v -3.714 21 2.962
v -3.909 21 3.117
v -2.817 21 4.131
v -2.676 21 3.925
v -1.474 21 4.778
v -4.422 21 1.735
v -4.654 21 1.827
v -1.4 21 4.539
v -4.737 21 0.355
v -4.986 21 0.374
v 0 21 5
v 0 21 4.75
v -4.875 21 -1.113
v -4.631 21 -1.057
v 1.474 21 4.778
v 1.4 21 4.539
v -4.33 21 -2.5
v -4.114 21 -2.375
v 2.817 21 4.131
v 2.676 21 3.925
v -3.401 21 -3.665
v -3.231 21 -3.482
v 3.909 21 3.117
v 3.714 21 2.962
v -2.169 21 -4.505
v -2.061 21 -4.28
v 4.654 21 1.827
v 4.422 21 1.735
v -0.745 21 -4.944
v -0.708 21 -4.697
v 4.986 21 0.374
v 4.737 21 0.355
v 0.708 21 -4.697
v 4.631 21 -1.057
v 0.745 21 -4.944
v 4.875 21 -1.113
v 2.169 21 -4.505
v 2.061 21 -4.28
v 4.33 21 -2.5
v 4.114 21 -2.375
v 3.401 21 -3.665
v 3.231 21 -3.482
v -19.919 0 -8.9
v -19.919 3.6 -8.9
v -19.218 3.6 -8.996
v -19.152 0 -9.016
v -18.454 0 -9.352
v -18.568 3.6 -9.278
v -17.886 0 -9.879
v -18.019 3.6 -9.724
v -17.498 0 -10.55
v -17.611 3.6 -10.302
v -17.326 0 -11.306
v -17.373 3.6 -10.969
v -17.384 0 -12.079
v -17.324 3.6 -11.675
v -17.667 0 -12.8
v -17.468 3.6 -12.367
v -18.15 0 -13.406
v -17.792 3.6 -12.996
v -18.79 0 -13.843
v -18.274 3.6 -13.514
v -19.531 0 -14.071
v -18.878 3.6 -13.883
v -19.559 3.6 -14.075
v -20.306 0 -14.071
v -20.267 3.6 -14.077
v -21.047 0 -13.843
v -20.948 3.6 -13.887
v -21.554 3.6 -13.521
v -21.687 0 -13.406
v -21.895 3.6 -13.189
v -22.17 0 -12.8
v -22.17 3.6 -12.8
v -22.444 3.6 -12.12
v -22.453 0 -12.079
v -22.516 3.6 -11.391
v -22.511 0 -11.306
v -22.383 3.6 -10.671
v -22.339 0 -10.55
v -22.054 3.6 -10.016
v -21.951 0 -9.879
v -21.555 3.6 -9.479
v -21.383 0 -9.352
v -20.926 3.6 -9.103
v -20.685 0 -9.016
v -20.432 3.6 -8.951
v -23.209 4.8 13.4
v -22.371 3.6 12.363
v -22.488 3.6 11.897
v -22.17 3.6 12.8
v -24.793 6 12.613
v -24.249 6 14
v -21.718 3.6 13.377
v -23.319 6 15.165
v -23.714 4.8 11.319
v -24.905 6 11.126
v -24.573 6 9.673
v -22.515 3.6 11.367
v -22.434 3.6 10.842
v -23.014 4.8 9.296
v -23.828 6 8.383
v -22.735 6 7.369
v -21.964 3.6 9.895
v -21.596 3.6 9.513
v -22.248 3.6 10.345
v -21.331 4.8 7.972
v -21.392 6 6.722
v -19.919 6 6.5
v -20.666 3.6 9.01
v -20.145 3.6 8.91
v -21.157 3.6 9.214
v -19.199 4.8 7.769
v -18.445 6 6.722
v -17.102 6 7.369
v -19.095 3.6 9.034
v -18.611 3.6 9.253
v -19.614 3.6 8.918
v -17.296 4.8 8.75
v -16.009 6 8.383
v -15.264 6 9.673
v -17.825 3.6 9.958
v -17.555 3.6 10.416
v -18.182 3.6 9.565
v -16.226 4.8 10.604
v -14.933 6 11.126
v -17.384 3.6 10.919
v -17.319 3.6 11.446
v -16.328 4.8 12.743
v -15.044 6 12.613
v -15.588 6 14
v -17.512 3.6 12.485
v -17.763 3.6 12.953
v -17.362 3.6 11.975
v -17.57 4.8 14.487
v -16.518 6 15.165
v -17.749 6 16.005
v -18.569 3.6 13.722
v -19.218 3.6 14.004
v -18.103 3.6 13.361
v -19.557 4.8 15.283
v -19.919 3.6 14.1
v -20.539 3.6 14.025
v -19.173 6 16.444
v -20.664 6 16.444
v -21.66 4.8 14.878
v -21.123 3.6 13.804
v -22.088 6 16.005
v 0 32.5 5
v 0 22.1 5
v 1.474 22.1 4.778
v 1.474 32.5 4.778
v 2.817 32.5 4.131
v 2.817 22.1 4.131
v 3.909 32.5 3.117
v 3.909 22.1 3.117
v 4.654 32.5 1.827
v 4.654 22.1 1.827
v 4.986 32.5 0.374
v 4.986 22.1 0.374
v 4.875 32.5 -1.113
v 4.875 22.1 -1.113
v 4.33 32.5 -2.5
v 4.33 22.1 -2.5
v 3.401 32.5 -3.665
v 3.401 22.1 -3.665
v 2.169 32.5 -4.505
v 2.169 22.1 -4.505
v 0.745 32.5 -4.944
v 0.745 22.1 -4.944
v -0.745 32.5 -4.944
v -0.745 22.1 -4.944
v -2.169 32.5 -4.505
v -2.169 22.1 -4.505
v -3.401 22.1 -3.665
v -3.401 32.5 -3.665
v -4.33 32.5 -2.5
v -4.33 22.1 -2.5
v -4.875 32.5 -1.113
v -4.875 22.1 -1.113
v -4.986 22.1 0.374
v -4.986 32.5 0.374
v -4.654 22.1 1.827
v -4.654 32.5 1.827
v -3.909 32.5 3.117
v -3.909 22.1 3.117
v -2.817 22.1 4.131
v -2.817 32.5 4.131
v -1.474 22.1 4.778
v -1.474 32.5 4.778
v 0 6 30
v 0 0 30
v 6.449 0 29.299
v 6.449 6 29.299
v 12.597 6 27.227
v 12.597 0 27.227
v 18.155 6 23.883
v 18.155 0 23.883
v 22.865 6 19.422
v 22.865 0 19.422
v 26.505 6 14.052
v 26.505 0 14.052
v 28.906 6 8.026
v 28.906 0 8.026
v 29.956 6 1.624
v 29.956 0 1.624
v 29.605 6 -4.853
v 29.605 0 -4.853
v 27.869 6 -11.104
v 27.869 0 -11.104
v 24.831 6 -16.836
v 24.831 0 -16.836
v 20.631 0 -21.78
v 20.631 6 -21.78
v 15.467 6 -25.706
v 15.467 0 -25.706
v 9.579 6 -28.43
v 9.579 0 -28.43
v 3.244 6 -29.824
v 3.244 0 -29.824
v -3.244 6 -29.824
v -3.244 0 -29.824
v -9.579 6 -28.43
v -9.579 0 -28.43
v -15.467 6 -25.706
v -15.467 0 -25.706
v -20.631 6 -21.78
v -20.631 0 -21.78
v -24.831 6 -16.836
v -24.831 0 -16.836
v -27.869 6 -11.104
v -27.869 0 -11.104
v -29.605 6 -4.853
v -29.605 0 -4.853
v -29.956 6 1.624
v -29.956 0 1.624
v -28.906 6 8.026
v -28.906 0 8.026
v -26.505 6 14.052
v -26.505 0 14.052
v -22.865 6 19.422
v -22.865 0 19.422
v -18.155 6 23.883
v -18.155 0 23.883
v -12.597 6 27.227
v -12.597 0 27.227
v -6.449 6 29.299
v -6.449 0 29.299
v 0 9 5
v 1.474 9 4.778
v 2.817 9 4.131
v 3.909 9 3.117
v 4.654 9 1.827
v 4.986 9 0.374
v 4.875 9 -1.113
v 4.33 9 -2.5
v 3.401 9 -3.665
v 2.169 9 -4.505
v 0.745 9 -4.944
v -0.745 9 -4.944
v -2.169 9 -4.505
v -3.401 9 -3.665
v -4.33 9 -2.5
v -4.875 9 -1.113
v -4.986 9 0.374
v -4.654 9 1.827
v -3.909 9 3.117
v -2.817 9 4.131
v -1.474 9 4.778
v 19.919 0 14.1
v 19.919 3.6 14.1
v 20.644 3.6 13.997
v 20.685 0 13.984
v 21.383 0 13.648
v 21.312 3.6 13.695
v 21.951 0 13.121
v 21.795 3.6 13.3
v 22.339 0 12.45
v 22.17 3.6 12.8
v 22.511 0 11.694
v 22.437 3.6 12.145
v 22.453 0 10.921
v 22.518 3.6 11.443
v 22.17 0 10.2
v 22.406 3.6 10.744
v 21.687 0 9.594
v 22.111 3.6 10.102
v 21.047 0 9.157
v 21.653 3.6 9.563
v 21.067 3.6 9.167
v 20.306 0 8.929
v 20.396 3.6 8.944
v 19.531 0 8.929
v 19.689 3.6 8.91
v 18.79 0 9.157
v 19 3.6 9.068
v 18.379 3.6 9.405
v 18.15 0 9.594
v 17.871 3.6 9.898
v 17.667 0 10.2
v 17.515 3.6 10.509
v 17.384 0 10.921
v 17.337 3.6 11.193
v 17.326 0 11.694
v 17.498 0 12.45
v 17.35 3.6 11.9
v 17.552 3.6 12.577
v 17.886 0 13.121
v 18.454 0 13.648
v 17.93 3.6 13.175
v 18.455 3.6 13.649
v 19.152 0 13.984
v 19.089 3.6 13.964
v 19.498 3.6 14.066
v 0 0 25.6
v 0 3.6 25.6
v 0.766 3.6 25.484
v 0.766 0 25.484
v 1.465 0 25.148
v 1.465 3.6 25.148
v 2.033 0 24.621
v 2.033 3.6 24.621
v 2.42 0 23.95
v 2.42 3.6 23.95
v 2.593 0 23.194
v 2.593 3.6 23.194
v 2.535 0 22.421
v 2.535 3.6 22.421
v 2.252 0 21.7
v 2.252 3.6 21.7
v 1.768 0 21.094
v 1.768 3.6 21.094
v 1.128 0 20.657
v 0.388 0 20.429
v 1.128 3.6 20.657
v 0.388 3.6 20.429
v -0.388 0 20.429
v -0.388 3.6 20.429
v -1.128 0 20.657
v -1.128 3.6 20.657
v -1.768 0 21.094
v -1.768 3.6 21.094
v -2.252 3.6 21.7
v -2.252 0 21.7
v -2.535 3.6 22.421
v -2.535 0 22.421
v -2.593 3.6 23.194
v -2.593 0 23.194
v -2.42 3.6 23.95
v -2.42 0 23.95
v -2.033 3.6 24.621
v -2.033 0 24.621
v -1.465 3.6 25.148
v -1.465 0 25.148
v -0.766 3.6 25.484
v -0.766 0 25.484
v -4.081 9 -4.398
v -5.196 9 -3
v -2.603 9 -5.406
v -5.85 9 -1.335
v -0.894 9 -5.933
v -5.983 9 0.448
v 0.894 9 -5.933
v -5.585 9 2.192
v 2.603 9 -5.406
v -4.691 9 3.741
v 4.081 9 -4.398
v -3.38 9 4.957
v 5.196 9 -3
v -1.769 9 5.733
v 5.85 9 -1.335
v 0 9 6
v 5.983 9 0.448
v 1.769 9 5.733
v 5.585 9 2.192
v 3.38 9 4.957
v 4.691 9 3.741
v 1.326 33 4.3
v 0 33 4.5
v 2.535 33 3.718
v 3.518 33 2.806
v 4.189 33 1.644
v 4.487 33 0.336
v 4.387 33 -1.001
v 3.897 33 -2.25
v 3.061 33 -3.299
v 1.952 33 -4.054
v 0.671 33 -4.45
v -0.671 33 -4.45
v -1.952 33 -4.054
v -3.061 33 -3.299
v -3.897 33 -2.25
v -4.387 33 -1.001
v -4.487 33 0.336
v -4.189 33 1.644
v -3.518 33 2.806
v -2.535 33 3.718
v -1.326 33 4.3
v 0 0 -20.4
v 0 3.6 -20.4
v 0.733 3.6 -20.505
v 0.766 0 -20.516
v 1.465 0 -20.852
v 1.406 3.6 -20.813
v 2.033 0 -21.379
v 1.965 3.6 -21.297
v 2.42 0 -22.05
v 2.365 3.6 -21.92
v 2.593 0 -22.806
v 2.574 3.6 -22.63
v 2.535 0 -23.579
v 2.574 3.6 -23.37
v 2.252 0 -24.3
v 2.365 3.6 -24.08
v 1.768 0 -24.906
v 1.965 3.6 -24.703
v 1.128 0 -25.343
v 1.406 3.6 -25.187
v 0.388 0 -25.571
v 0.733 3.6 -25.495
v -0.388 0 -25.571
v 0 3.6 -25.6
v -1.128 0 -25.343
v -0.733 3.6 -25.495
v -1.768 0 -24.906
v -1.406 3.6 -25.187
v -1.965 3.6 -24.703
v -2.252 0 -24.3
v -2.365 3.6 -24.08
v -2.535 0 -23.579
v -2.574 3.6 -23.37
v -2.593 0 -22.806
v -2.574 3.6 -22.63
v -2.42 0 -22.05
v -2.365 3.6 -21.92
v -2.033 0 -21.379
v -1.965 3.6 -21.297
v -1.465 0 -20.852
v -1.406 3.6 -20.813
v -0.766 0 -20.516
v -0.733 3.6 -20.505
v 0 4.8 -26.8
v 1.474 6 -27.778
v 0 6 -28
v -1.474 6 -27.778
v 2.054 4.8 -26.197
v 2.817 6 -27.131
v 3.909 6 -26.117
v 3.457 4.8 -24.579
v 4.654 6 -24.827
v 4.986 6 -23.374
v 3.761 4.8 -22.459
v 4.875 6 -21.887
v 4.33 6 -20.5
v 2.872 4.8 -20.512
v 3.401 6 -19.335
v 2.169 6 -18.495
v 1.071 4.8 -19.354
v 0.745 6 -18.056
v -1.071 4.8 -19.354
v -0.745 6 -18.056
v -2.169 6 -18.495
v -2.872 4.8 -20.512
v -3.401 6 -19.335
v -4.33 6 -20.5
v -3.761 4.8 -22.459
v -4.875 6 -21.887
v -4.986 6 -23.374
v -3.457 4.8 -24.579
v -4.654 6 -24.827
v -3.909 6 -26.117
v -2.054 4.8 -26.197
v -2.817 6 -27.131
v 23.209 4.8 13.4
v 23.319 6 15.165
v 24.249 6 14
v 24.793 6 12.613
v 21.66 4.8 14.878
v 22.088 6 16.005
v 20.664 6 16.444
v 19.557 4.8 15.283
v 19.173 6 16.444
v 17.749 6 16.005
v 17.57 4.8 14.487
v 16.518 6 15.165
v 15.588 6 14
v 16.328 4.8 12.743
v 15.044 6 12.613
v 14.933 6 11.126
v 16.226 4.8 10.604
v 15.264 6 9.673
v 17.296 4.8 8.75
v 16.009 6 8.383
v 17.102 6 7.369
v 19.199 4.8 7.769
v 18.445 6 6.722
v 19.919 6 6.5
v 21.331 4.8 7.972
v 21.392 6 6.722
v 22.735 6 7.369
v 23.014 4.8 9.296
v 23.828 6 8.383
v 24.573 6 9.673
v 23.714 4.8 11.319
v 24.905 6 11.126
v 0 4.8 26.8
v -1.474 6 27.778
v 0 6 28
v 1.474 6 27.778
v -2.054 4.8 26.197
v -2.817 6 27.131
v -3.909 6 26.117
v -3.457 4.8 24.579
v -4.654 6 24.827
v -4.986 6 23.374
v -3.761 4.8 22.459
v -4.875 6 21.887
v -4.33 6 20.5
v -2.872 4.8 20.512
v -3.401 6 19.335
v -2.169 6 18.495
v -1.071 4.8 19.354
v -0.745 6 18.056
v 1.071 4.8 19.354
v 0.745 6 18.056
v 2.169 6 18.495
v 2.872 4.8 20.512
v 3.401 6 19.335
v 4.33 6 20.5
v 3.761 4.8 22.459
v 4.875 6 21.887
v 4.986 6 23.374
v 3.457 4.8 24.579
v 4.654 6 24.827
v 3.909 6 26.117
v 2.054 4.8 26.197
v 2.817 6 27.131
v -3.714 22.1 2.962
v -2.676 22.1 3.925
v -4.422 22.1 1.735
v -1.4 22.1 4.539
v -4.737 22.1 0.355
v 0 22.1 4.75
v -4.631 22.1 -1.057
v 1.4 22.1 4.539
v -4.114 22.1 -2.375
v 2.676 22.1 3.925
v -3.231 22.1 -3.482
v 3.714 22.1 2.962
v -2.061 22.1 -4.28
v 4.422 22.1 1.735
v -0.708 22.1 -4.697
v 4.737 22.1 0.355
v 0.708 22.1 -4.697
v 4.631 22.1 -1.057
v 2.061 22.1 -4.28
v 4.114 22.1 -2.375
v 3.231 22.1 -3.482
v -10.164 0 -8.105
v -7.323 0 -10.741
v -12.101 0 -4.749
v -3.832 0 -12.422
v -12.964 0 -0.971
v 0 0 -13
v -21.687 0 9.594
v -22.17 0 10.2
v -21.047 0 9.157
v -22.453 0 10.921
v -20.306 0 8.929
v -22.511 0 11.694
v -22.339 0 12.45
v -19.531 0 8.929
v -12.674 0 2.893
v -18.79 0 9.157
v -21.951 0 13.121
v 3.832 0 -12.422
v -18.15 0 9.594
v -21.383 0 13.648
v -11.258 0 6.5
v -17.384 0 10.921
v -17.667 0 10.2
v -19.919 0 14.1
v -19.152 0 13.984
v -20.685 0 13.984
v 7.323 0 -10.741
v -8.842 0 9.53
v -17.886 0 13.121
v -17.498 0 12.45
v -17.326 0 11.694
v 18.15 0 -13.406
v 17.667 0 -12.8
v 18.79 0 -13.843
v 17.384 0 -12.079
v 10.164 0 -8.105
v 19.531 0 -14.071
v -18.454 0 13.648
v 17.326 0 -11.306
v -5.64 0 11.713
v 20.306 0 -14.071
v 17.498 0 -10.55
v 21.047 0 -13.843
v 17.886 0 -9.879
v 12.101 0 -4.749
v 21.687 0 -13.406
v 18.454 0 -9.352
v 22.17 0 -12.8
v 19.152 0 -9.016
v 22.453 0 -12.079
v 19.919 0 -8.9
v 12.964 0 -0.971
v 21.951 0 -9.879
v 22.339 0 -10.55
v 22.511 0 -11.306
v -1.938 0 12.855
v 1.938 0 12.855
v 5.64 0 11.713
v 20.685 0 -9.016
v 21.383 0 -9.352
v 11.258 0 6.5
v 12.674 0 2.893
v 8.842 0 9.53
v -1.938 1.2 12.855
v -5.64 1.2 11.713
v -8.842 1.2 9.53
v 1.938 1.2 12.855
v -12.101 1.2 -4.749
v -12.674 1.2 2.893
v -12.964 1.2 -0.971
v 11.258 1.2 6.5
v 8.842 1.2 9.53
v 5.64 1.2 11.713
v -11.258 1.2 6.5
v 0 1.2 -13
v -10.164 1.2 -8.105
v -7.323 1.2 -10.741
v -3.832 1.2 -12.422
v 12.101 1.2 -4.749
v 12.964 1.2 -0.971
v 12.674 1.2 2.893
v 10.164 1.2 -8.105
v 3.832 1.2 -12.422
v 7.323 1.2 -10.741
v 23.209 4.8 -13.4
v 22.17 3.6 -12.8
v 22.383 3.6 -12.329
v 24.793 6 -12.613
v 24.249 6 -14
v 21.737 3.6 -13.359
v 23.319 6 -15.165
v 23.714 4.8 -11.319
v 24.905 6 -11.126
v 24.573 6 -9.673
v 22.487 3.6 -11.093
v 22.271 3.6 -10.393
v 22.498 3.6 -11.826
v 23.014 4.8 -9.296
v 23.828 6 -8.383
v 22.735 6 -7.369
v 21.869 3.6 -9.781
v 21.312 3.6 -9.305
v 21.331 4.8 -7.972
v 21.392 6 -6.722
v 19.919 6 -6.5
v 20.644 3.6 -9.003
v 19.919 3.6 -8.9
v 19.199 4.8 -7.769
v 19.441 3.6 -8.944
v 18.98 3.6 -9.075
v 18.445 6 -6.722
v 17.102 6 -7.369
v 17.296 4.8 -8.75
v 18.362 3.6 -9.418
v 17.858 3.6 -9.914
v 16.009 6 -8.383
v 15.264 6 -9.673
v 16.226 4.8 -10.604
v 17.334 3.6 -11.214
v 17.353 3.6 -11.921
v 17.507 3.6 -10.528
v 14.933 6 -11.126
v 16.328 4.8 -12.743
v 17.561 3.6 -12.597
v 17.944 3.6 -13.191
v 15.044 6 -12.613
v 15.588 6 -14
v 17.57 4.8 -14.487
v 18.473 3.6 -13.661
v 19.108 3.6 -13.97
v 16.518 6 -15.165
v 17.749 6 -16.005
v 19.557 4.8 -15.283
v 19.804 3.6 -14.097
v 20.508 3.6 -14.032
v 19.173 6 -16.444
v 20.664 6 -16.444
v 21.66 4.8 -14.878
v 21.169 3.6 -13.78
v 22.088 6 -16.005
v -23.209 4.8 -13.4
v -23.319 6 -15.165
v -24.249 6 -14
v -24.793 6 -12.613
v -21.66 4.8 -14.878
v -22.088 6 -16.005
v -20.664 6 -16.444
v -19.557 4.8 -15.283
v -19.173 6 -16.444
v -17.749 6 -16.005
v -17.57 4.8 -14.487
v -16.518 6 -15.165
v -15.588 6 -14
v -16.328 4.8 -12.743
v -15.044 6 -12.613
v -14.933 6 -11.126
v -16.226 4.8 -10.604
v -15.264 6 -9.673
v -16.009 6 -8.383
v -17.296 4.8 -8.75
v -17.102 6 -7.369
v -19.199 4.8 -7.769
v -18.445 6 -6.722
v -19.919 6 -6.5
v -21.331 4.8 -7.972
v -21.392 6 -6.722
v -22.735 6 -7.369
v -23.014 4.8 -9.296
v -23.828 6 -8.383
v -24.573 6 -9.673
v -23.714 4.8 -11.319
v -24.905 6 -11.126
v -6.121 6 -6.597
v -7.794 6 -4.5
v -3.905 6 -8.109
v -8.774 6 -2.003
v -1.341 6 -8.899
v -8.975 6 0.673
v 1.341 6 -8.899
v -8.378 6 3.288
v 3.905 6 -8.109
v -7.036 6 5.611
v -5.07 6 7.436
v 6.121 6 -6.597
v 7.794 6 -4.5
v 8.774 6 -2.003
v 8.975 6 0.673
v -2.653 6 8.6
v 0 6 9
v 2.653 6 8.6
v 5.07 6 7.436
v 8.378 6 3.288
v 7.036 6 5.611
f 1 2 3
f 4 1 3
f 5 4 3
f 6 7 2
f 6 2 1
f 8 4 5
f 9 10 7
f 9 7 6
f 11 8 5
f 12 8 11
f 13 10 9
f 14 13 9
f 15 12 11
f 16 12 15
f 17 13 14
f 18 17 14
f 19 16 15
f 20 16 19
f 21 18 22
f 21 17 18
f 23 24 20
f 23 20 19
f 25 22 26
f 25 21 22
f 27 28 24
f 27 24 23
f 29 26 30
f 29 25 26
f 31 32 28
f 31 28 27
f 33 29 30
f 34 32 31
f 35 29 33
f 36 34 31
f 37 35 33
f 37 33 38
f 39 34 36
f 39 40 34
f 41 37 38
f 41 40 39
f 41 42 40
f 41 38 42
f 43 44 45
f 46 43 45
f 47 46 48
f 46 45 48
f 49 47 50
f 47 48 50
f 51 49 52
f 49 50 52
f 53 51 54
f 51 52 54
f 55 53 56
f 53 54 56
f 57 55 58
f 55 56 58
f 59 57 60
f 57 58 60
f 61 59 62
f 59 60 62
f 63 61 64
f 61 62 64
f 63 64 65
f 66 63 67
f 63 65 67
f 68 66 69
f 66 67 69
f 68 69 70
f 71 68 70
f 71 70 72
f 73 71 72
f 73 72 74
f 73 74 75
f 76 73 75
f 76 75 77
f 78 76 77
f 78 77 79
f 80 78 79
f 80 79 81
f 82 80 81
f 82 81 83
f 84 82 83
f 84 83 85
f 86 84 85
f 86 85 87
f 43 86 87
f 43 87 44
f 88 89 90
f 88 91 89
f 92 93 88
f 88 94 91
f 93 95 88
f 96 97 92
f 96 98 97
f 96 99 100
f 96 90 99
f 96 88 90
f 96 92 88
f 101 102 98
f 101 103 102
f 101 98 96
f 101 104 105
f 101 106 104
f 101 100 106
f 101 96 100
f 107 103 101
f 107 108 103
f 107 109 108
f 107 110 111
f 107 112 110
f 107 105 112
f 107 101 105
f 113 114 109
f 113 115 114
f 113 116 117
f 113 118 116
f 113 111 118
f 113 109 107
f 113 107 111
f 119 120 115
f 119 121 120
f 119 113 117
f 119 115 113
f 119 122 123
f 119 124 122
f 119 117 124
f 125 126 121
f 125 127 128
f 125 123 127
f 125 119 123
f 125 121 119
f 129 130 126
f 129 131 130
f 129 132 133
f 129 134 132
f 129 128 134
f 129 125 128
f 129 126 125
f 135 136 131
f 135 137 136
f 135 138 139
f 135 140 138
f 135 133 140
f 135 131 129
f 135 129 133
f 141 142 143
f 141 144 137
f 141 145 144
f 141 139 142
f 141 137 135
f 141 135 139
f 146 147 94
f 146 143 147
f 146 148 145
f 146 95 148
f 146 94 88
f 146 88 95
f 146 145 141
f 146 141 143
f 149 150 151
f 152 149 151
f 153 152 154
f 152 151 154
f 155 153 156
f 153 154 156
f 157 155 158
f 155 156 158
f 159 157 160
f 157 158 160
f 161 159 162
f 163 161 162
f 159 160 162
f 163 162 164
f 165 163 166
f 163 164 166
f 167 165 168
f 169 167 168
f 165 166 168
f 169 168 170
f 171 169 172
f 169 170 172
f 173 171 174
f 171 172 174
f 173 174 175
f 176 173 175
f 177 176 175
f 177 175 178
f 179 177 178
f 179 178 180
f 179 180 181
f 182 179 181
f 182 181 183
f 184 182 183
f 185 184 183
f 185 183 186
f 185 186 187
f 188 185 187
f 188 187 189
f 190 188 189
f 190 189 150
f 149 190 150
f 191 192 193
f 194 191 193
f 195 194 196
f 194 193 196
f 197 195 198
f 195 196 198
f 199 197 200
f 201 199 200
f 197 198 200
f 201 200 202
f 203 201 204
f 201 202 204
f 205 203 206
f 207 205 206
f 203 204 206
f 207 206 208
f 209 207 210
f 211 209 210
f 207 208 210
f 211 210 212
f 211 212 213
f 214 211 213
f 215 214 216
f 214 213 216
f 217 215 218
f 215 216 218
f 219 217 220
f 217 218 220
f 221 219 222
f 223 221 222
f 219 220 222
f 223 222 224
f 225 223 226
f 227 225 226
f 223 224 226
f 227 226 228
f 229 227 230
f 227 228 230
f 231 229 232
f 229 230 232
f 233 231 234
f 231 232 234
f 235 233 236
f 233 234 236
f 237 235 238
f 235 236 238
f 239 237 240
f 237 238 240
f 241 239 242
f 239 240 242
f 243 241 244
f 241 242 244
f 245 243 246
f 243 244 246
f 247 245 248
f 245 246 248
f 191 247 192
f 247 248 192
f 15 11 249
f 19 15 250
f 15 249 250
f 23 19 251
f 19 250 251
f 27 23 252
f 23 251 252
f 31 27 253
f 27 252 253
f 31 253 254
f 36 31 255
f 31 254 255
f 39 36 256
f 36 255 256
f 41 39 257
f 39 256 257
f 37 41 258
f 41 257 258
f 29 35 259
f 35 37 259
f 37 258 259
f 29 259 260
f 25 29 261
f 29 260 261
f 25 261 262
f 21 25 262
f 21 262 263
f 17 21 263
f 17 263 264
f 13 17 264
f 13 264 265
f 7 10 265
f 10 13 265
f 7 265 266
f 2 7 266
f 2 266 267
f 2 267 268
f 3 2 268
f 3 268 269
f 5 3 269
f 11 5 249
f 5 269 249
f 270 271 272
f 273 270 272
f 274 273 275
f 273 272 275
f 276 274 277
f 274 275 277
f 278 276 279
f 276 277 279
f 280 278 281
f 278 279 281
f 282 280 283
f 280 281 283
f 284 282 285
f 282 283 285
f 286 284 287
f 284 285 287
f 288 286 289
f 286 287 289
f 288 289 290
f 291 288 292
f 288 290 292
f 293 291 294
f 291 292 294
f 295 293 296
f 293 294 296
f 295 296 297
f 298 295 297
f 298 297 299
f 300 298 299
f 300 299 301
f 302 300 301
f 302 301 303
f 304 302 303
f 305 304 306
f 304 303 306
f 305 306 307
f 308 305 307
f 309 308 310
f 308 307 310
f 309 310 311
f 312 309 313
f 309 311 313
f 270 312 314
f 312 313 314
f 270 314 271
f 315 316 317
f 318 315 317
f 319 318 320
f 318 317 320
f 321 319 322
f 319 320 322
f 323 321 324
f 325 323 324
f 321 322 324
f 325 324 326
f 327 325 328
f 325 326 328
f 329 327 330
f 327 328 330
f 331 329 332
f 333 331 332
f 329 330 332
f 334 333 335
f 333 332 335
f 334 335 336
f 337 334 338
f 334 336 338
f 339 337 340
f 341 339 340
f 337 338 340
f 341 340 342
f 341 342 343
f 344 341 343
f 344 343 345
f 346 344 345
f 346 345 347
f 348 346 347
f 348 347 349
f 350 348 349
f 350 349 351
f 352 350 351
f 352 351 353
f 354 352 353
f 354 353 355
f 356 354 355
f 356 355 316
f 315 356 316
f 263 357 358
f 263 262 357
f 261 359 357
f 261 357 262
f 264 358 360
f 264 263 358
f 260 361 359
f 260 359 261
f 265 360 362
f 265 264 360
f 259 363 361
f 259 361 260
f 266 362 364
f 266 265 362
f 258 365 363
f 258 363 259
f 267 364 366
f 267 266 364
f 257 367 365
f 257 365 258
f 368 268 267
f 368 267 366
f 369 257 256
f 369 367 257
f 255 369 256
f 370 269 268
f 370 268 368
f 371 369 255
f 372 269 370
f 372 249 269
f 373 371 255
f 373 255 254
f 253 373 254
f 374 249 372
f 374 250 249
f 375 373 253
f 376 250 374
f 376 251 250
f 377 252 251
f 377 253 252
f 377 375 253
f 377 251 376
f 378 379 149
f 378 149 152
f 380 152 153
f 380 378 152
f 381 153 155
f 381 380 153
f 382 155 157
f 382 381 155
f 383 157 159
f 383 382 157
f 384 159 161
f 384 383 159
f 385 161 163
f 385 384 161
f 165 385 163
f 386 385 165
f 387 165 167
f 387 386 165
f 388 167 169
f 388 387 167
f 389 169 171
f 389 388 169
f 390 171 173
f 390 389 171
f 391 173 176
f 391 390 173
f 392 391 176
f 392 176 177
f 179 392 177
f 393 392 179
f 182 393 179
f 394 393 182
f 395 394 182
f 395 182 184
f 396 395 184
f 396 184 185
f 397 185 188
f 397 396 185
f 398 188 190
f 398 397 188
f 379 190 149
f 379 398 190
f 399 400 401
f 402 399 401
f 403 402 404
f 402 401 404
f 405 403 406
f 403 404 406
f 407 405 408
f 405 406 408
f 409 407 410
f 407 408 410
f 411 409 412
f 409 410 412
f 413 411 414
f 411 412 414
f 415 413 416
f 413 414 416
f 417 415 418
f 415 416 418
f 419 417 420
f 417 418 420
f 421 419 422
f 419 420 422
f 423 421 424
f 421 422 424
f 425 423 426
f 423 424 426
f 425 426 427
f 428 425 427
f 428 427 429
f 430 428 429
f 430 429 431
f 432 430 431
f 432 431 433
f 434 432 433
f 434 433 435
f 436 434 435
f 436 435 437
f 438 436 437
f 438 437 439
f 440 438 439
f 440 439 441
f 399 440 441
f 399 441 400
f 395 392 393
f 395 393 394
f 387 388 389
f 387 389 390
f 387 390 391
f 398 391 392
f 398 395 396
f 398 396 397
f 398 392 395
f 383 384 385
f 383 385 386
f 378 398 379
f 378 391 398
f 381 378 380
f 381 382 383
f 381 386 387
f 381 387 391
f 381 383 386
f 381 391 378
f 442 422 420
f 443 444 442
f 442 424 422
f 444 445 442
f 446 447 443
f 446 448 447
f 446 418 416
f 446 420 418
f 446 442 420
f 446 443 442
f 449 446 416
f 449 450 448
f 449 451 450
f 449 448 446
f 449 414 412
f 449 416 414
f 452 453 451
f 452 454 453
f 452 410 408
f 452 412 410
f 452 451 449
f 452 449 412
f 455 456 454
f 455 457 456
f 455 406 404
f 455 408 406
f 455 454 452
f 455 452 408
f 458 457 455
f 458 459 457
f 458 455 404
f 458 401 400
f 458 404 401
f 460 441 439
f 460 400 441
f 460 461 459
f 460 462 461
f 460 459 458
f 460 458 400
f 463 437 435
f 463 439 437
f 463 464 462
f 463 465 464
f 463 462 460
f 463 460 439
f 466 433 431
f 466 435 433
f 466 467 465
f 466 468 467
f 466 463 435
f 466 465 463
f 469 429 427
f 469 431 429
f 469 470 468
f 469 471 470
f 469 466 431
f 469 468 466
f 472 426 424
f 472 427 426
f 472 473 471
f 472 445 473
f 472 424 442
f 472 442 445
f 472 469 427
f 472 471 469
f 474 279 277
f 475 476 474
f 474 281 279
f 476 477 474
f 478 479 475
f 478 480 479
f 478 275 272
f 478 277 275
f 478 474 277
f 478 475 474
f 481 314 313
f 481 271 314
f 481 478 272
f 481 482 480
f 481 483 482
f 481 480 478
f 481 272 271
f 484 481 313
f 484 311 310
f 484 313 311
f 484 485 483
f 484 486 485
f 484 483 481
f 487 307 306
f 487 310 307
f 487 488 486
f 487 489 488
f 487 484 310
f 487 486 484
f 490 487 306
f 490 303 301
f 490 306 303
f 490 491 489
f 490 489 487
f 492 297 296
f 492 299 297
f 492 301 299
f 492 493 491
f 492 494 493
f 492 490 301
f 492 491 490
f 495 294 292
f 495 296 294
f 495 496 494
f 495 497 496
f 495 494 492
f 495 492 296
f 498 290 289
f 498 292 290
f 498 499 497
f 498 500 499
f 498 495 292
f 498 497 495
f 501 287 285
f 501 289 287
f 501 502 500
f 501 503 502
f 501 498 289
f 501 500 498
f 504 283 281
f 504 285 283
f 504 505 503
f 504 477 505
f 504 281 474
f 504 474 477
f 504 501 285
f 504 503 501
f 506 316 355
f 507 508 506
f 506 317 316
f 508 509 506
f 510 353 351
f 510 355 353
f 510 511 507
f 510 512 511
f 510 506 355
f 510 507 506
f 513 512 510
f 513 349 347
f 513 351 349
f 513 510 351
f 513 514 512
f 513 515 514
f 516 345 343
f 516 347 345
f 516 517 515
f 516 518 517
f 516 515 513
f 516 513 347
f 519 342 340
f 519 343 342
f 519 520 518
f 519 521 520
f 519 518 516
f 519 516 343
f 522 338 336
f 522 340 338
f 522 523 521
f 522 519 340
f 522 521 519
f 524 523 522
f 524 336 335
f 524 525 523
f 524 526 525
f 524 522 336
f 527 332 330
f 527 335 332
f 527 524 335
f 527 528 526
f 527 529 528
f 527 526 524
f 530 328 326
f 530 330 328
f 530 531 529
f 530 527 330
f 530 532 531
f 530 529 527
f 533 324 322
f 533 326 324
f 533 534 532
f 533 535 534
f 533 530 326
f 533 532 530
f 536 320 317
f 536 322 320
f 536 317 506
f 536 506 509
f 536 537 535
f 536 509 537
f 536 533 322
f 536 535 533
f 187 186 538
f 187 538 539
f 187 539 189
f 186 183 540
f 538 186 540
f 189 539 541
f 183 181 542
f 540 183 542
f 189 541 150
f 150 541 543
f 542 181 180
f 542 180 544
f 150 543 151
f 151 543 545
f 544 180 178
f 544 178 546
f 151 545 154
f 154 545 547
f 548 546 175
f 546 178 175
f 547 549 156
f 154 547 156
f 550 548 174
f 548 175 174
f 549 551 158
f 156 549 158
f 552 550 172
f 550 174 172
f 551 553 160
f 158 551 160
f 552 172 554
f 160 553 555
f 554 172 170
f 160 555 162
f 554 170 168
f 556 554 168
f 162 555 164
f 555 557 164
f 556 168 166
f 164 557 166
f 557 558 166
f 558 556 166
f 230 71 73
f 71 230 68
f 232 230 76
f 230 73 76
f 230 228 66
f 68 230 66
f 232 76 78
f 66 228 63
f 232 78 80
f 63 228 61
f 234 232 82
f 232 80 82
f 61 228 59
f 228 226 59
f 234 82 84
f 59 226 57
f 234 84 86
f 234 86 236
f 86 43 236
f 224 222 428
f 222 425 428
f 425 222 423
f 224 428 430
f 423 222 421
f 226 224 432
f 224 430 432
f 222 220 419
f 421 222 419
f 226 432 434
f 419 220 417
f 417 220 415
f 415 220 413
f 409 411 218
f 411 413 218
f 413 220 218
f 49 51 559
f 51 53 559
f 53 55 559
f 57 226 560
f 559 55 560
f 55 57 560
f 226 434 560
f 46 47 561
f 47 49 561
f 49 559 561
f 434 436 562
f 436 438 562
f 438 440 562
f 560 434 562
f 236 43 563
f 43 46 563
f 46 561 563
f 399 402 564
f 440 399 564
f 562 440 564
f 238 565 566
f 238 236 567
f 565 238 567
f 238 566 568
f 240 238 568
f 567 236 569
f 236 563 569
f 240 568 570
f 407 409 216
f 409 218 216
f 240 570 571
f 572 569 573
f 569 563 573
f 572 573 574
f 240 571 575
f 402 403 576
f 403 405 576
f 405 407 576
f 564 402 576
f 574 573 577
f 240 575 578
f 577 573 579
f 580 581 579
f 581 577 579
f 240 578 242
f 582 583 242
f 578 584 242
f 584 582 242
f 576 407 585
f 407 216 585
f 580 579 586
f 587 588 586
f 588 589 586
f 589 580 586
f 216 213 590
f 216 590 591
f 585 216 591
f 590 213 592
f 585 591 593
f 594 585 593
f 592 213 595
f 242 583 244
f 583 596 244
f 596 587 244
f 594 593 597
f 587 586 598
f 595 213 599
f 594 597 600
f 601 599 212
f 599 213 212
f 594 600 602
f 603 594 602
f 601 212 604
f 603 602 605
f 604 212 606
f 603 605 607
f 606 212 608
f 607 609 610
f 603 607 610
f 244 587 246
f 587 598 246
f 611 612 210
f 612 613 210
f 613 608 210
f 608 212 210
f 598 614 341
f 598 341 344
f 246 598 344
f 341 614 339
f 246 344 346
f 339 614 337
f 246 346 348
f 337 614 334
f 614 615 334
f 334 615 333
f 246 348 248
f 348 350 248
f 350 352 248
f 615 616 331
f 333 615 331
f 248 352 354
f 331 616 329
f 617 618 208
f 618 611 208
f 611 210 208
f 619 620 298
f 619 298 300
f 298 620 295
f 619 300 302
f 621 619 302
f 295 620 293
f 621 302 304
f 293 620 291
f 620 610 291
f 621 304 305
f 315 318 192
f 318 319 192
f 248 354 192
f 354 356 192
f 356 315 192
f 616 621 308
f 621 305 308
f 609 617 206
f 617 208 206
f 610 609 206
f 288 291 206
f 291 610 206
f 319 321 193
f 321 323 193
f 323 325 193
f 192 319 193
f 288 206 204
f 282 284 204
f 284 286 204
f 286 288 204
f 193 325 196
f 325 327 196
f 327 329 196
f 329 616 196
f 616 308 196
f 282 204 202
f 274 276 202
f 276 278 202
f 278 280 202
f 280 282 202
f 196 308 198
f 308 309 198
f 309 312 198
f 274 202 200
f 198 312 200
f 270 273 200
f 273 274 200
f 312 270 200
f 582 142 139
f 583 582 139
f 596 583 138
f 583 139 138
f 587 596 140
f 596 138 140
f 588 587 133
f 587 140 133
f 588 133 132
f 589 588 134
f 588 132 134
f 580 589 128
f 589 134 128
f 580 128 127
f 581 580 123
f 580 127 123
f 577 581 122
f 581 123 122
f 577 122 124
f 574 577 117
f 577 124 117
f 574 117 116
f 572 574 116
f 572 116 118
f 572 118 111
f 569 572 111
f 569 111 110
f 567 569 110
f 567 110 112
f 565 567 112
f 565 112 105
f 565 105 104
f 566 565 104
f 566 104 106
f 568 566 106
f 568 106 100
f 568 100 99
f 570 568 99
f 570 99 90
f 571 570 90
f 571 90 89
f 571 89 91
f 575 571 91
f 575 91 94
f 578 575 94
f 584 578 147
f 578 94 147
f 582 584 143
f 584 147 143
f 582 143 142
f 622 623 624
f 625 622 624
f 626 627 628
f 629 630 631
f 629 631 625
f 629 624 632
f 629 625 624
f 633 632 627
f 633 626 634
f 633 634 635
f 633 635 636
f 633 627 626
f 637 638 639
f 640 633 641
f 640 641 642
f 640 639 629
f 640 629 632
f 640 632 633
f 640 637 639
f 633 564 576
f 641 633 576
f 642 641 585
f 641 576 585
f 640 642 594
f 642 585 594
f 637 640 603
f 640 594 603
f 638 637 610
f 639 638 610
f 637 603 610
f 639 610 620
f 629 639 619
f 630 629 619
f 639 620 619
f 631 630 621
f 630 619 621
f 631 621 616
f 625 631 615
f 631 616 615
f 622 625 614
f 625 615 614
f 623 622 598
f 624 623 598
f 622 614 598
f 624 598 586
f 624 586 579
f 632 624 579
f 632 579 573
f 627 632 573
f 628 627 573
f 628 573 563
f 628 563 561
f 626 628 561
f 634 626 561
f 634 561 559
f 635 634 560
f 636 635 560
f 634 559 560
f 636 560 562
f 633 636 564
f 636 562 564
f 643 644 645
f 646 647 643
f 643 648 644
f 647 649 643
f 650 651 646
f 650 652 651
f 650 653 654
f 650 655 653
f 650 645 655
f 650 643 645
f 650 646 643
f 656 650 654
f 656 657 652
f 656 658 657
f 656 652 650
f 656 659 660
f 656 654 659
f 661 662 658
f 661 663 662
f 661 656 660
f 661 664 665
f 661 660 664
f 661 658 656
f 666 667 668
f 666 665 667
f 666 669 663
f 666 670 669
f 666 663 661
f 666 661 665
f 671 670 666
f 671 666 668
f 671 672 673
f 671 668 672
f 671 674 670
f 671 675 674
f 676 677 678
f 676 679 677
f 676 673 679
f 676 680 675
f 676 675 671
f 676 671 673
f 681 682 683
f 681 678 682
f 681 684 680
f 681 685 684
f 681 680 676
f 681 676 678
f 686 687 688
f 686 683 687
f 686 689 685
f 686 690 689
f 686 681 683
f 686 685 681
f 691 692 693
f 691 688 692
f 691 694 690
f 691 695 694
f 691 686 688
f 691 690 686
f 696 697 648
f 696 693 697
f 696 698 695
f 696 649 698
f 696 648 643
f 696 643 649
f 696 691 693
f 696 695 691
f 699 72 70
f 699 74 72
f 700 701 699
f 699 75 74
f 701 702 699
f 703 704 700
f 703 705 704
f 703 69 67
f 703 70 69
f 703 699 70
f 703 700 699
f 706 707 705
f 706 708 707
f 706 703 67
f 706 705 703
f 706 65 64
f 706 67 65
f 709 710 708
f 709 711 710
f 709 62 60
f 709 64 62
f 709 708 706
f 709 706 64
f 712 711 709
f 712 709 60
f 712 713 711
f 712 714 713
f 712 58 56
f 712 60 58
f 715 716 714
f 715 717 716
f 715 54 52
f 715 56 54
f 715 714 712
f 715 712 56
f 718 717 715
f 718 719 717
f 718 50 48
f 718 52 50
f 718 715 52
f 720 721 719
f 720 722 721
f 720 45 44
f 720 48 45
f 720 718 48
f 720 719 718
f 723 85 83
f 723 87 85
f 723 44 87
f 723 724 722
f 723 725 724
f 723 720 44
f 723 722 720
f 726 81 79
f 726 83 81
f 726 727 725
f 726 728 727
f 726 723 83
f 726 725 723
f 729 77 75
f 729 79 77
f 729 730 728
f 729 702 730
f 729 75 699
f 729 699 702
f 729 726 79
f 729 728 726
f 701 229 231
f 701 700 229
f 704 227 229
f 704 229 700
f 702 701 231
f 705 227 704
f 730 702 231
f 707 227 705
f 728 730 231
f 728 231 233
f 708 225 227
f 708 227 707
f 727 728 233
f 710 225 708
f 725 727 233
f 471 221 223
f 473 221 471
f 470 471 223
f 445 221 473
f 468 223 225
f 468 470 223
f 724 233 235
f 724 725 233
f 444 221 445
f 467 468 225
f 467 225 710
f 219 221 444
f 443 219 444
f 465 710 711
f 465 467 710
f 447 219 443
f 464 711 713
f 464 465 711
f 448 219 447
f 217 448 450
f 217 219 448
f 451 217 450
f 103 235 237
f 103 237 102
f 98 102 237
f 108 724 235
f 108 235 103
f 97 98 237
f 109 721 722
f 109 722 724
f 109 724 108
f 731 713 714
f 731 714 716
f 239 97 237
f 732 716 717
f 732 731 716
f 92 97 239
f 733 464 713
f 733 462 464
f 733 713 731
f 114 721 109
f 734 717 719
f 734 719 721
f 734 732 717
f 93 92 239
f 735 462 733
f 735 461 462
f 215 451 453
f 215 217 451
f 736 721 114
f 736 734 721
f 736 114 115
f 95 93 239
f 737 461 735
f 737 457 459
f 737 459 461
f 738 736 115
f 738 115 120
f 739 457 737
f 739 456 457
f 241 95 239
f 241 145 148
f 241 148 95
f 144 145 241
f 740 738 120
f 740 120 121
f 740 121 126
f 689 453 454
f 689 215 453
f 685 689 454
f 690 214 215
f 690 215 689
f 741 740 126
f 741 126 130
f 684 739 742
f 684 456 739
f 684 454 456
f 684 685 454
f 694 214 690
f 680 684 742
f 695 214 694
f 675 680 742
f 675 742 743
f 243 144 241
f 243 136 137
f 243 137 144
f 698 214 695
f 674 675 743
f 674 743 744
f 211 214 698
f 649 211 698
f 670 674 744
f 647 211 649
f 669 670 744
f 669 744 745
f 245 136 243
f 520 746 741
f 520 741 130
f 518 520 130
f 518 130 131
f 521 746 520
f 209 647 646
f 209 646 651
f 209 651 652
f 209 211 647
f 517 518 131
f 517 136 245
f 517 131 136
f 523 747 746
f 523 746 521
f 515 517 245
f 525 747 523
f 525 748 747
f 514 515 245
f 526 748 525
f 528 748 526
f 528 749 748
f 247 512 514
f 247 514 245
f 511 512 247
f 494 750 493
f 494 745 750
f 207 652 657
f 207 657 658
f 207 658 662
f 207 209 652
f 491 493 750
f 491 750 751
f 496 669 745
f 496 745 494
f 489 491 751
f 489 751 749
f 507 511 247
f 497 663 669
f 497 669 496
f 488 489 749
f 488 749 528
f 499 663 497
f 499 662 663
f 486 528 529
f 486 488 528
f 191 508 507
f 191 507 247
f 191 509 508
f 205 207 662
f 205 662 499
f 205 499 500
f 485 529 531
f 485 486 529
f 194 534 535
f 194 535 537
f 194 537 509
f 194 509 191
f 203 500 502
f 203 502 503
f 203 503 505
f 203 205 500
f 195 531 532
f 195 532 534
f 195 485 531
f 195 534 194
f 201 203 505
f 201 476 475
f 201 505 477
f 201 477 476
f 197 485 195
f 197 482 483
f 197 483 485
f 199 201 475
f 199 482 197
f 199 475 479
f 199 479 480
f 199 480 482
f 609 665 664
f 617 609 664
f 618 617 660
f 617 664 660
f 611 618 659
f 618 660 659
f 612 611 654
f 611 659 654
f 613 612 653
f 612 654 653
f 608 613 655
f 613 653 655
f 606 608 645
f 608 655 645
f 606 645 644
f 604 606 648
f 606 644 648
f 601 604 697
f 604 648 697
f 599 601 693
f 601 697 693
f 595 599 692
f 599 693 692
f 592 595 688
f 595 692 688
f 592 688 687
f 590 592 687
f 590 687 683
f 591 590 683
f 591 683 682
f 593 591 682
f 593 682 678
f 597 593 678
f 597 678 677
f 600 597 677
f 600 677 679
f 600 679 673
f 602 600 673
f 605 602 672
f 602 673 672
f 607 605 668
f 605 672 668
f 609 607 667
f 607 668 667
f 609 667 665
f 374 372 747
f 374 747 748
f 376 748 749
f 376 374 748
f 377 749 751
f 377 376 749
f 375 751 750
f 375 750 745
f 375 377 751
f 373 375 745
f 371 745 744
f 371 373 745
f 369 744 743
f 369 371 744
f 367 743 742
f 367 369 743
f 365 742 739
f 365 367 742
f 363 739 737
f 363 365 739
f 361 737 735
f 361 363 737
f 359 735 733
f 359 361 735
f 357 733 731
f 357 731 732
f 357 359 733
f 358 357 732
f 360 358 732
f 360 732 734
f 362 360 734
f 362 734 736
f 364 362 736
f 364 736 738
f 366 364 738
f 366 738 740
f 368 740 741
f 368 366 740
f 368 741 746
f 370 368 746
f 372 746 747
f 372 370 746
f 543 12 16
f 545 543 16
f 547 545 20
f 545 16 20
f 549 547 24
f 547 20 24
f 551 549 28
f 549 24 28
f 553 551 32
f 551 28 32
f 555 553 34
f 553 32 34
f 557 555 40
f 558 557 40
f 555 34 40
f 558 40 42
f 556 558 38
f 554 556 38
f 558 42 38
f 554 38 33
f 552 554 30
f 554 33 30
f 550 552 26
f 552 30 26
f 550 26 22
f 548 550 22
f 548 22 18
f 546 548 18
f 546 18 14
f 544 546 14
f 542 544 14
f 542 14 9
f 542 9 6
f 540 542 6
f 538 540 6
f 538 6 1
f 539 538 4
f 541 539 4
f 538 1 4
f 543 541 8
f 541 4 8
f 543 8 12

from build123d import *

# Parameters (mm, degrees)
SKETCH_1_R               = 30
EXTRUDE_1_DEPTH          = 6
SKETCH_2_R               = 6
EXTRUDE_2_DEPTH          = 3
SKETCH_3_R               = 5
EXTRUDE_3_DEPTH          = 24
CUT_EXTRUDE_START        = -12
SKETCH_4_OUTSIDE_W       = 80.208
SKETCH_4_OUTSIDE_H       = 80.208
SKETCH_4_OUTSIDE_R       = 4.75
CUT_EXTRUDE_1_DEPTH      = 1.1
SKETCH_5_R               = 2.6
CUT_EXTRUDE_2_DEPTH      = 51.289163843
CHAMFER_1_SIZE           = 3
CHAMFER_2_SIZE           = 0.5
SKETCH_6_R               = 13
CUT_EXTRUDE_3_DEPTH      = 1.2
PATTERN_CIRCULAR_1_COUNT = 6


with BuildPart() as part:
    # 草图1 → 凸台-拉伸1 (new body)
    with BuildSketch(Plane(origin=(0, 0, 0), x_dir=(1, 0, 0), z_dir=(0, 1, 0))):
        with Locations(Location((0, 0, 0), (0, 0, 270))):
            Circle(SKETCH_1_R)
    extrude(amount=EXTRUDE_1_DEPTH)

    # 草图2 → 凸台-拉伸2 (add)
    with BuildSketch(Plane(origin=(0, 6, 0), x_dir=(1, 0, 0), z_dir=(0, 1, 0))):
        with Locations(Location((0, 0, 0), (0, 0, 270))):
            Circle(SKETCH_2_R)
    extrude(amount=EXTRUDE_2_DEPTH)

    # 草图3 → 凸台-拉伸3 (add)
    with BuildSketch(Plane(origin=(0, 9, 0), x_dir=(1, 0, 0), z_dir=(0, 1, 0))):
        with Locations(Location((0, 0, 0), (0, 0, 270))):
            Circle(SKETCH_3_R)
    extrude(amount=EXTRUDE_3_DEPTH)

    # 草图4 outside → 切除-拉伸1 (cut)
    with BuildSketch(Plane(origin=(0, 33, 0), x_dir=(1, 0, 0), z_dir=(0, 1, 0)).offset(CUT_EXTRUDE_START)):
        Rectangle(SKETCH_4_OUTSIDE_W, SKETCH_4_OUTSIDE_H)
        with Locations(Location((0, 0, 0), (0, 0, 270))):
            Circle(SKETCH_4_OUTSIDE_R, mode=Mode.SUBTRACT)
    extrude(amount=CUT_EXTRUDE_1_DEPTH, mode=Mode.SUBTRACT)

    # 草图5 → 切除-拉伸2 (cut, through all)
    with BuildSketch(Plane(origin=(0, 6, 0), x_dir=(1, 0, 0), z_dir=(0, 1, 0))):
        with Locations(Location((0, 23, 0), (0, 0, 270))):
            Circle(SKETCH_5_R)
        with Locations(Location((19.918584287, 11.5, 0), (0, 0, 270))):
            Circle(SKETCH_5_R)
        with Locations(Location((19.918584287, -11.5, 0), (0, 0, 270))):
            Circle(SKETCH_5_R)
        with Locations(Location((0, -23, 0), (0, 0, 270))):
            Circle(SKETCH_5_R)
        with Locations(Location((-19.918584287, -11.5, 0), (0, 0, 270))):
            Circle(SKETCH_5_R)
        with Locations(Location((-19.918584287, 11.5, 0), (0, 0, 270))):
            Circle(SKETCH_5_R)
    extrude(amount=-CUT_EXTRUDE_2_DEPTH, mode=Mode.SUBTRACT)

    # 倒角1
    chamfer_1_edges = [part.edges().sort_by_distance(p)[0] for p in [
        (0, 6, -6),
    ]]
    chamfer(chamfer_1_edges, length=CHAMFER_1_SIZE - 0.0001)  # a hair under: the kernel refuses the full size

    # 倒角2
    chamfer_2_edges = [part.edges().sort_by_distance(p)[0] for p in [
        (0, 33, -5),
    ]]
    chamfer(chamfer_2_edges, length=CHAMFER_2_SIZE)

    # 草图6 → 切除-拉伸3 (cut)
    with BuildSketch(Plane.XZ):
        with Locations(Location((0, 0, 0), (0, 0, 270))):
            Circle(SKETCH_6_R)
    extrude(amount=-CUT_EXTRUDE_3_DEPTH, mode=Mode.SUBTRACT)

    # 草图7 → 切除-旋转1 (revolve, cut)
    with BuildSketch(Plane(origin=(0, 0, 0), x_dir=(0, 0, -1), z_dir=(1, 0, 0))):
        Polygon((-28, 6), (-23, 6), (-23, 1.9), (-23.9, 1.9), align=None)
    cut_revolve_1 = revolve(axis=Axis((0, 6, 23), (0, -1, 0)), mode=Mode.SUBTRACT)

    # 阵列(圆周)1: 切除-旋转1 ×6 about axis
    pattern_circular_1_axis = Axis((0, 0, 0), (0, 1, 0))
    for i in range(1, PATTERN_CIRCULAR_1_COUNT):
        add(cut_revolve_1.rotate(pattern_circular_1_axis, i * 360 / PATTERN_CIRCULAR_1_COUNT), mode=Mode.SUBTRACT)


solid = part.part
